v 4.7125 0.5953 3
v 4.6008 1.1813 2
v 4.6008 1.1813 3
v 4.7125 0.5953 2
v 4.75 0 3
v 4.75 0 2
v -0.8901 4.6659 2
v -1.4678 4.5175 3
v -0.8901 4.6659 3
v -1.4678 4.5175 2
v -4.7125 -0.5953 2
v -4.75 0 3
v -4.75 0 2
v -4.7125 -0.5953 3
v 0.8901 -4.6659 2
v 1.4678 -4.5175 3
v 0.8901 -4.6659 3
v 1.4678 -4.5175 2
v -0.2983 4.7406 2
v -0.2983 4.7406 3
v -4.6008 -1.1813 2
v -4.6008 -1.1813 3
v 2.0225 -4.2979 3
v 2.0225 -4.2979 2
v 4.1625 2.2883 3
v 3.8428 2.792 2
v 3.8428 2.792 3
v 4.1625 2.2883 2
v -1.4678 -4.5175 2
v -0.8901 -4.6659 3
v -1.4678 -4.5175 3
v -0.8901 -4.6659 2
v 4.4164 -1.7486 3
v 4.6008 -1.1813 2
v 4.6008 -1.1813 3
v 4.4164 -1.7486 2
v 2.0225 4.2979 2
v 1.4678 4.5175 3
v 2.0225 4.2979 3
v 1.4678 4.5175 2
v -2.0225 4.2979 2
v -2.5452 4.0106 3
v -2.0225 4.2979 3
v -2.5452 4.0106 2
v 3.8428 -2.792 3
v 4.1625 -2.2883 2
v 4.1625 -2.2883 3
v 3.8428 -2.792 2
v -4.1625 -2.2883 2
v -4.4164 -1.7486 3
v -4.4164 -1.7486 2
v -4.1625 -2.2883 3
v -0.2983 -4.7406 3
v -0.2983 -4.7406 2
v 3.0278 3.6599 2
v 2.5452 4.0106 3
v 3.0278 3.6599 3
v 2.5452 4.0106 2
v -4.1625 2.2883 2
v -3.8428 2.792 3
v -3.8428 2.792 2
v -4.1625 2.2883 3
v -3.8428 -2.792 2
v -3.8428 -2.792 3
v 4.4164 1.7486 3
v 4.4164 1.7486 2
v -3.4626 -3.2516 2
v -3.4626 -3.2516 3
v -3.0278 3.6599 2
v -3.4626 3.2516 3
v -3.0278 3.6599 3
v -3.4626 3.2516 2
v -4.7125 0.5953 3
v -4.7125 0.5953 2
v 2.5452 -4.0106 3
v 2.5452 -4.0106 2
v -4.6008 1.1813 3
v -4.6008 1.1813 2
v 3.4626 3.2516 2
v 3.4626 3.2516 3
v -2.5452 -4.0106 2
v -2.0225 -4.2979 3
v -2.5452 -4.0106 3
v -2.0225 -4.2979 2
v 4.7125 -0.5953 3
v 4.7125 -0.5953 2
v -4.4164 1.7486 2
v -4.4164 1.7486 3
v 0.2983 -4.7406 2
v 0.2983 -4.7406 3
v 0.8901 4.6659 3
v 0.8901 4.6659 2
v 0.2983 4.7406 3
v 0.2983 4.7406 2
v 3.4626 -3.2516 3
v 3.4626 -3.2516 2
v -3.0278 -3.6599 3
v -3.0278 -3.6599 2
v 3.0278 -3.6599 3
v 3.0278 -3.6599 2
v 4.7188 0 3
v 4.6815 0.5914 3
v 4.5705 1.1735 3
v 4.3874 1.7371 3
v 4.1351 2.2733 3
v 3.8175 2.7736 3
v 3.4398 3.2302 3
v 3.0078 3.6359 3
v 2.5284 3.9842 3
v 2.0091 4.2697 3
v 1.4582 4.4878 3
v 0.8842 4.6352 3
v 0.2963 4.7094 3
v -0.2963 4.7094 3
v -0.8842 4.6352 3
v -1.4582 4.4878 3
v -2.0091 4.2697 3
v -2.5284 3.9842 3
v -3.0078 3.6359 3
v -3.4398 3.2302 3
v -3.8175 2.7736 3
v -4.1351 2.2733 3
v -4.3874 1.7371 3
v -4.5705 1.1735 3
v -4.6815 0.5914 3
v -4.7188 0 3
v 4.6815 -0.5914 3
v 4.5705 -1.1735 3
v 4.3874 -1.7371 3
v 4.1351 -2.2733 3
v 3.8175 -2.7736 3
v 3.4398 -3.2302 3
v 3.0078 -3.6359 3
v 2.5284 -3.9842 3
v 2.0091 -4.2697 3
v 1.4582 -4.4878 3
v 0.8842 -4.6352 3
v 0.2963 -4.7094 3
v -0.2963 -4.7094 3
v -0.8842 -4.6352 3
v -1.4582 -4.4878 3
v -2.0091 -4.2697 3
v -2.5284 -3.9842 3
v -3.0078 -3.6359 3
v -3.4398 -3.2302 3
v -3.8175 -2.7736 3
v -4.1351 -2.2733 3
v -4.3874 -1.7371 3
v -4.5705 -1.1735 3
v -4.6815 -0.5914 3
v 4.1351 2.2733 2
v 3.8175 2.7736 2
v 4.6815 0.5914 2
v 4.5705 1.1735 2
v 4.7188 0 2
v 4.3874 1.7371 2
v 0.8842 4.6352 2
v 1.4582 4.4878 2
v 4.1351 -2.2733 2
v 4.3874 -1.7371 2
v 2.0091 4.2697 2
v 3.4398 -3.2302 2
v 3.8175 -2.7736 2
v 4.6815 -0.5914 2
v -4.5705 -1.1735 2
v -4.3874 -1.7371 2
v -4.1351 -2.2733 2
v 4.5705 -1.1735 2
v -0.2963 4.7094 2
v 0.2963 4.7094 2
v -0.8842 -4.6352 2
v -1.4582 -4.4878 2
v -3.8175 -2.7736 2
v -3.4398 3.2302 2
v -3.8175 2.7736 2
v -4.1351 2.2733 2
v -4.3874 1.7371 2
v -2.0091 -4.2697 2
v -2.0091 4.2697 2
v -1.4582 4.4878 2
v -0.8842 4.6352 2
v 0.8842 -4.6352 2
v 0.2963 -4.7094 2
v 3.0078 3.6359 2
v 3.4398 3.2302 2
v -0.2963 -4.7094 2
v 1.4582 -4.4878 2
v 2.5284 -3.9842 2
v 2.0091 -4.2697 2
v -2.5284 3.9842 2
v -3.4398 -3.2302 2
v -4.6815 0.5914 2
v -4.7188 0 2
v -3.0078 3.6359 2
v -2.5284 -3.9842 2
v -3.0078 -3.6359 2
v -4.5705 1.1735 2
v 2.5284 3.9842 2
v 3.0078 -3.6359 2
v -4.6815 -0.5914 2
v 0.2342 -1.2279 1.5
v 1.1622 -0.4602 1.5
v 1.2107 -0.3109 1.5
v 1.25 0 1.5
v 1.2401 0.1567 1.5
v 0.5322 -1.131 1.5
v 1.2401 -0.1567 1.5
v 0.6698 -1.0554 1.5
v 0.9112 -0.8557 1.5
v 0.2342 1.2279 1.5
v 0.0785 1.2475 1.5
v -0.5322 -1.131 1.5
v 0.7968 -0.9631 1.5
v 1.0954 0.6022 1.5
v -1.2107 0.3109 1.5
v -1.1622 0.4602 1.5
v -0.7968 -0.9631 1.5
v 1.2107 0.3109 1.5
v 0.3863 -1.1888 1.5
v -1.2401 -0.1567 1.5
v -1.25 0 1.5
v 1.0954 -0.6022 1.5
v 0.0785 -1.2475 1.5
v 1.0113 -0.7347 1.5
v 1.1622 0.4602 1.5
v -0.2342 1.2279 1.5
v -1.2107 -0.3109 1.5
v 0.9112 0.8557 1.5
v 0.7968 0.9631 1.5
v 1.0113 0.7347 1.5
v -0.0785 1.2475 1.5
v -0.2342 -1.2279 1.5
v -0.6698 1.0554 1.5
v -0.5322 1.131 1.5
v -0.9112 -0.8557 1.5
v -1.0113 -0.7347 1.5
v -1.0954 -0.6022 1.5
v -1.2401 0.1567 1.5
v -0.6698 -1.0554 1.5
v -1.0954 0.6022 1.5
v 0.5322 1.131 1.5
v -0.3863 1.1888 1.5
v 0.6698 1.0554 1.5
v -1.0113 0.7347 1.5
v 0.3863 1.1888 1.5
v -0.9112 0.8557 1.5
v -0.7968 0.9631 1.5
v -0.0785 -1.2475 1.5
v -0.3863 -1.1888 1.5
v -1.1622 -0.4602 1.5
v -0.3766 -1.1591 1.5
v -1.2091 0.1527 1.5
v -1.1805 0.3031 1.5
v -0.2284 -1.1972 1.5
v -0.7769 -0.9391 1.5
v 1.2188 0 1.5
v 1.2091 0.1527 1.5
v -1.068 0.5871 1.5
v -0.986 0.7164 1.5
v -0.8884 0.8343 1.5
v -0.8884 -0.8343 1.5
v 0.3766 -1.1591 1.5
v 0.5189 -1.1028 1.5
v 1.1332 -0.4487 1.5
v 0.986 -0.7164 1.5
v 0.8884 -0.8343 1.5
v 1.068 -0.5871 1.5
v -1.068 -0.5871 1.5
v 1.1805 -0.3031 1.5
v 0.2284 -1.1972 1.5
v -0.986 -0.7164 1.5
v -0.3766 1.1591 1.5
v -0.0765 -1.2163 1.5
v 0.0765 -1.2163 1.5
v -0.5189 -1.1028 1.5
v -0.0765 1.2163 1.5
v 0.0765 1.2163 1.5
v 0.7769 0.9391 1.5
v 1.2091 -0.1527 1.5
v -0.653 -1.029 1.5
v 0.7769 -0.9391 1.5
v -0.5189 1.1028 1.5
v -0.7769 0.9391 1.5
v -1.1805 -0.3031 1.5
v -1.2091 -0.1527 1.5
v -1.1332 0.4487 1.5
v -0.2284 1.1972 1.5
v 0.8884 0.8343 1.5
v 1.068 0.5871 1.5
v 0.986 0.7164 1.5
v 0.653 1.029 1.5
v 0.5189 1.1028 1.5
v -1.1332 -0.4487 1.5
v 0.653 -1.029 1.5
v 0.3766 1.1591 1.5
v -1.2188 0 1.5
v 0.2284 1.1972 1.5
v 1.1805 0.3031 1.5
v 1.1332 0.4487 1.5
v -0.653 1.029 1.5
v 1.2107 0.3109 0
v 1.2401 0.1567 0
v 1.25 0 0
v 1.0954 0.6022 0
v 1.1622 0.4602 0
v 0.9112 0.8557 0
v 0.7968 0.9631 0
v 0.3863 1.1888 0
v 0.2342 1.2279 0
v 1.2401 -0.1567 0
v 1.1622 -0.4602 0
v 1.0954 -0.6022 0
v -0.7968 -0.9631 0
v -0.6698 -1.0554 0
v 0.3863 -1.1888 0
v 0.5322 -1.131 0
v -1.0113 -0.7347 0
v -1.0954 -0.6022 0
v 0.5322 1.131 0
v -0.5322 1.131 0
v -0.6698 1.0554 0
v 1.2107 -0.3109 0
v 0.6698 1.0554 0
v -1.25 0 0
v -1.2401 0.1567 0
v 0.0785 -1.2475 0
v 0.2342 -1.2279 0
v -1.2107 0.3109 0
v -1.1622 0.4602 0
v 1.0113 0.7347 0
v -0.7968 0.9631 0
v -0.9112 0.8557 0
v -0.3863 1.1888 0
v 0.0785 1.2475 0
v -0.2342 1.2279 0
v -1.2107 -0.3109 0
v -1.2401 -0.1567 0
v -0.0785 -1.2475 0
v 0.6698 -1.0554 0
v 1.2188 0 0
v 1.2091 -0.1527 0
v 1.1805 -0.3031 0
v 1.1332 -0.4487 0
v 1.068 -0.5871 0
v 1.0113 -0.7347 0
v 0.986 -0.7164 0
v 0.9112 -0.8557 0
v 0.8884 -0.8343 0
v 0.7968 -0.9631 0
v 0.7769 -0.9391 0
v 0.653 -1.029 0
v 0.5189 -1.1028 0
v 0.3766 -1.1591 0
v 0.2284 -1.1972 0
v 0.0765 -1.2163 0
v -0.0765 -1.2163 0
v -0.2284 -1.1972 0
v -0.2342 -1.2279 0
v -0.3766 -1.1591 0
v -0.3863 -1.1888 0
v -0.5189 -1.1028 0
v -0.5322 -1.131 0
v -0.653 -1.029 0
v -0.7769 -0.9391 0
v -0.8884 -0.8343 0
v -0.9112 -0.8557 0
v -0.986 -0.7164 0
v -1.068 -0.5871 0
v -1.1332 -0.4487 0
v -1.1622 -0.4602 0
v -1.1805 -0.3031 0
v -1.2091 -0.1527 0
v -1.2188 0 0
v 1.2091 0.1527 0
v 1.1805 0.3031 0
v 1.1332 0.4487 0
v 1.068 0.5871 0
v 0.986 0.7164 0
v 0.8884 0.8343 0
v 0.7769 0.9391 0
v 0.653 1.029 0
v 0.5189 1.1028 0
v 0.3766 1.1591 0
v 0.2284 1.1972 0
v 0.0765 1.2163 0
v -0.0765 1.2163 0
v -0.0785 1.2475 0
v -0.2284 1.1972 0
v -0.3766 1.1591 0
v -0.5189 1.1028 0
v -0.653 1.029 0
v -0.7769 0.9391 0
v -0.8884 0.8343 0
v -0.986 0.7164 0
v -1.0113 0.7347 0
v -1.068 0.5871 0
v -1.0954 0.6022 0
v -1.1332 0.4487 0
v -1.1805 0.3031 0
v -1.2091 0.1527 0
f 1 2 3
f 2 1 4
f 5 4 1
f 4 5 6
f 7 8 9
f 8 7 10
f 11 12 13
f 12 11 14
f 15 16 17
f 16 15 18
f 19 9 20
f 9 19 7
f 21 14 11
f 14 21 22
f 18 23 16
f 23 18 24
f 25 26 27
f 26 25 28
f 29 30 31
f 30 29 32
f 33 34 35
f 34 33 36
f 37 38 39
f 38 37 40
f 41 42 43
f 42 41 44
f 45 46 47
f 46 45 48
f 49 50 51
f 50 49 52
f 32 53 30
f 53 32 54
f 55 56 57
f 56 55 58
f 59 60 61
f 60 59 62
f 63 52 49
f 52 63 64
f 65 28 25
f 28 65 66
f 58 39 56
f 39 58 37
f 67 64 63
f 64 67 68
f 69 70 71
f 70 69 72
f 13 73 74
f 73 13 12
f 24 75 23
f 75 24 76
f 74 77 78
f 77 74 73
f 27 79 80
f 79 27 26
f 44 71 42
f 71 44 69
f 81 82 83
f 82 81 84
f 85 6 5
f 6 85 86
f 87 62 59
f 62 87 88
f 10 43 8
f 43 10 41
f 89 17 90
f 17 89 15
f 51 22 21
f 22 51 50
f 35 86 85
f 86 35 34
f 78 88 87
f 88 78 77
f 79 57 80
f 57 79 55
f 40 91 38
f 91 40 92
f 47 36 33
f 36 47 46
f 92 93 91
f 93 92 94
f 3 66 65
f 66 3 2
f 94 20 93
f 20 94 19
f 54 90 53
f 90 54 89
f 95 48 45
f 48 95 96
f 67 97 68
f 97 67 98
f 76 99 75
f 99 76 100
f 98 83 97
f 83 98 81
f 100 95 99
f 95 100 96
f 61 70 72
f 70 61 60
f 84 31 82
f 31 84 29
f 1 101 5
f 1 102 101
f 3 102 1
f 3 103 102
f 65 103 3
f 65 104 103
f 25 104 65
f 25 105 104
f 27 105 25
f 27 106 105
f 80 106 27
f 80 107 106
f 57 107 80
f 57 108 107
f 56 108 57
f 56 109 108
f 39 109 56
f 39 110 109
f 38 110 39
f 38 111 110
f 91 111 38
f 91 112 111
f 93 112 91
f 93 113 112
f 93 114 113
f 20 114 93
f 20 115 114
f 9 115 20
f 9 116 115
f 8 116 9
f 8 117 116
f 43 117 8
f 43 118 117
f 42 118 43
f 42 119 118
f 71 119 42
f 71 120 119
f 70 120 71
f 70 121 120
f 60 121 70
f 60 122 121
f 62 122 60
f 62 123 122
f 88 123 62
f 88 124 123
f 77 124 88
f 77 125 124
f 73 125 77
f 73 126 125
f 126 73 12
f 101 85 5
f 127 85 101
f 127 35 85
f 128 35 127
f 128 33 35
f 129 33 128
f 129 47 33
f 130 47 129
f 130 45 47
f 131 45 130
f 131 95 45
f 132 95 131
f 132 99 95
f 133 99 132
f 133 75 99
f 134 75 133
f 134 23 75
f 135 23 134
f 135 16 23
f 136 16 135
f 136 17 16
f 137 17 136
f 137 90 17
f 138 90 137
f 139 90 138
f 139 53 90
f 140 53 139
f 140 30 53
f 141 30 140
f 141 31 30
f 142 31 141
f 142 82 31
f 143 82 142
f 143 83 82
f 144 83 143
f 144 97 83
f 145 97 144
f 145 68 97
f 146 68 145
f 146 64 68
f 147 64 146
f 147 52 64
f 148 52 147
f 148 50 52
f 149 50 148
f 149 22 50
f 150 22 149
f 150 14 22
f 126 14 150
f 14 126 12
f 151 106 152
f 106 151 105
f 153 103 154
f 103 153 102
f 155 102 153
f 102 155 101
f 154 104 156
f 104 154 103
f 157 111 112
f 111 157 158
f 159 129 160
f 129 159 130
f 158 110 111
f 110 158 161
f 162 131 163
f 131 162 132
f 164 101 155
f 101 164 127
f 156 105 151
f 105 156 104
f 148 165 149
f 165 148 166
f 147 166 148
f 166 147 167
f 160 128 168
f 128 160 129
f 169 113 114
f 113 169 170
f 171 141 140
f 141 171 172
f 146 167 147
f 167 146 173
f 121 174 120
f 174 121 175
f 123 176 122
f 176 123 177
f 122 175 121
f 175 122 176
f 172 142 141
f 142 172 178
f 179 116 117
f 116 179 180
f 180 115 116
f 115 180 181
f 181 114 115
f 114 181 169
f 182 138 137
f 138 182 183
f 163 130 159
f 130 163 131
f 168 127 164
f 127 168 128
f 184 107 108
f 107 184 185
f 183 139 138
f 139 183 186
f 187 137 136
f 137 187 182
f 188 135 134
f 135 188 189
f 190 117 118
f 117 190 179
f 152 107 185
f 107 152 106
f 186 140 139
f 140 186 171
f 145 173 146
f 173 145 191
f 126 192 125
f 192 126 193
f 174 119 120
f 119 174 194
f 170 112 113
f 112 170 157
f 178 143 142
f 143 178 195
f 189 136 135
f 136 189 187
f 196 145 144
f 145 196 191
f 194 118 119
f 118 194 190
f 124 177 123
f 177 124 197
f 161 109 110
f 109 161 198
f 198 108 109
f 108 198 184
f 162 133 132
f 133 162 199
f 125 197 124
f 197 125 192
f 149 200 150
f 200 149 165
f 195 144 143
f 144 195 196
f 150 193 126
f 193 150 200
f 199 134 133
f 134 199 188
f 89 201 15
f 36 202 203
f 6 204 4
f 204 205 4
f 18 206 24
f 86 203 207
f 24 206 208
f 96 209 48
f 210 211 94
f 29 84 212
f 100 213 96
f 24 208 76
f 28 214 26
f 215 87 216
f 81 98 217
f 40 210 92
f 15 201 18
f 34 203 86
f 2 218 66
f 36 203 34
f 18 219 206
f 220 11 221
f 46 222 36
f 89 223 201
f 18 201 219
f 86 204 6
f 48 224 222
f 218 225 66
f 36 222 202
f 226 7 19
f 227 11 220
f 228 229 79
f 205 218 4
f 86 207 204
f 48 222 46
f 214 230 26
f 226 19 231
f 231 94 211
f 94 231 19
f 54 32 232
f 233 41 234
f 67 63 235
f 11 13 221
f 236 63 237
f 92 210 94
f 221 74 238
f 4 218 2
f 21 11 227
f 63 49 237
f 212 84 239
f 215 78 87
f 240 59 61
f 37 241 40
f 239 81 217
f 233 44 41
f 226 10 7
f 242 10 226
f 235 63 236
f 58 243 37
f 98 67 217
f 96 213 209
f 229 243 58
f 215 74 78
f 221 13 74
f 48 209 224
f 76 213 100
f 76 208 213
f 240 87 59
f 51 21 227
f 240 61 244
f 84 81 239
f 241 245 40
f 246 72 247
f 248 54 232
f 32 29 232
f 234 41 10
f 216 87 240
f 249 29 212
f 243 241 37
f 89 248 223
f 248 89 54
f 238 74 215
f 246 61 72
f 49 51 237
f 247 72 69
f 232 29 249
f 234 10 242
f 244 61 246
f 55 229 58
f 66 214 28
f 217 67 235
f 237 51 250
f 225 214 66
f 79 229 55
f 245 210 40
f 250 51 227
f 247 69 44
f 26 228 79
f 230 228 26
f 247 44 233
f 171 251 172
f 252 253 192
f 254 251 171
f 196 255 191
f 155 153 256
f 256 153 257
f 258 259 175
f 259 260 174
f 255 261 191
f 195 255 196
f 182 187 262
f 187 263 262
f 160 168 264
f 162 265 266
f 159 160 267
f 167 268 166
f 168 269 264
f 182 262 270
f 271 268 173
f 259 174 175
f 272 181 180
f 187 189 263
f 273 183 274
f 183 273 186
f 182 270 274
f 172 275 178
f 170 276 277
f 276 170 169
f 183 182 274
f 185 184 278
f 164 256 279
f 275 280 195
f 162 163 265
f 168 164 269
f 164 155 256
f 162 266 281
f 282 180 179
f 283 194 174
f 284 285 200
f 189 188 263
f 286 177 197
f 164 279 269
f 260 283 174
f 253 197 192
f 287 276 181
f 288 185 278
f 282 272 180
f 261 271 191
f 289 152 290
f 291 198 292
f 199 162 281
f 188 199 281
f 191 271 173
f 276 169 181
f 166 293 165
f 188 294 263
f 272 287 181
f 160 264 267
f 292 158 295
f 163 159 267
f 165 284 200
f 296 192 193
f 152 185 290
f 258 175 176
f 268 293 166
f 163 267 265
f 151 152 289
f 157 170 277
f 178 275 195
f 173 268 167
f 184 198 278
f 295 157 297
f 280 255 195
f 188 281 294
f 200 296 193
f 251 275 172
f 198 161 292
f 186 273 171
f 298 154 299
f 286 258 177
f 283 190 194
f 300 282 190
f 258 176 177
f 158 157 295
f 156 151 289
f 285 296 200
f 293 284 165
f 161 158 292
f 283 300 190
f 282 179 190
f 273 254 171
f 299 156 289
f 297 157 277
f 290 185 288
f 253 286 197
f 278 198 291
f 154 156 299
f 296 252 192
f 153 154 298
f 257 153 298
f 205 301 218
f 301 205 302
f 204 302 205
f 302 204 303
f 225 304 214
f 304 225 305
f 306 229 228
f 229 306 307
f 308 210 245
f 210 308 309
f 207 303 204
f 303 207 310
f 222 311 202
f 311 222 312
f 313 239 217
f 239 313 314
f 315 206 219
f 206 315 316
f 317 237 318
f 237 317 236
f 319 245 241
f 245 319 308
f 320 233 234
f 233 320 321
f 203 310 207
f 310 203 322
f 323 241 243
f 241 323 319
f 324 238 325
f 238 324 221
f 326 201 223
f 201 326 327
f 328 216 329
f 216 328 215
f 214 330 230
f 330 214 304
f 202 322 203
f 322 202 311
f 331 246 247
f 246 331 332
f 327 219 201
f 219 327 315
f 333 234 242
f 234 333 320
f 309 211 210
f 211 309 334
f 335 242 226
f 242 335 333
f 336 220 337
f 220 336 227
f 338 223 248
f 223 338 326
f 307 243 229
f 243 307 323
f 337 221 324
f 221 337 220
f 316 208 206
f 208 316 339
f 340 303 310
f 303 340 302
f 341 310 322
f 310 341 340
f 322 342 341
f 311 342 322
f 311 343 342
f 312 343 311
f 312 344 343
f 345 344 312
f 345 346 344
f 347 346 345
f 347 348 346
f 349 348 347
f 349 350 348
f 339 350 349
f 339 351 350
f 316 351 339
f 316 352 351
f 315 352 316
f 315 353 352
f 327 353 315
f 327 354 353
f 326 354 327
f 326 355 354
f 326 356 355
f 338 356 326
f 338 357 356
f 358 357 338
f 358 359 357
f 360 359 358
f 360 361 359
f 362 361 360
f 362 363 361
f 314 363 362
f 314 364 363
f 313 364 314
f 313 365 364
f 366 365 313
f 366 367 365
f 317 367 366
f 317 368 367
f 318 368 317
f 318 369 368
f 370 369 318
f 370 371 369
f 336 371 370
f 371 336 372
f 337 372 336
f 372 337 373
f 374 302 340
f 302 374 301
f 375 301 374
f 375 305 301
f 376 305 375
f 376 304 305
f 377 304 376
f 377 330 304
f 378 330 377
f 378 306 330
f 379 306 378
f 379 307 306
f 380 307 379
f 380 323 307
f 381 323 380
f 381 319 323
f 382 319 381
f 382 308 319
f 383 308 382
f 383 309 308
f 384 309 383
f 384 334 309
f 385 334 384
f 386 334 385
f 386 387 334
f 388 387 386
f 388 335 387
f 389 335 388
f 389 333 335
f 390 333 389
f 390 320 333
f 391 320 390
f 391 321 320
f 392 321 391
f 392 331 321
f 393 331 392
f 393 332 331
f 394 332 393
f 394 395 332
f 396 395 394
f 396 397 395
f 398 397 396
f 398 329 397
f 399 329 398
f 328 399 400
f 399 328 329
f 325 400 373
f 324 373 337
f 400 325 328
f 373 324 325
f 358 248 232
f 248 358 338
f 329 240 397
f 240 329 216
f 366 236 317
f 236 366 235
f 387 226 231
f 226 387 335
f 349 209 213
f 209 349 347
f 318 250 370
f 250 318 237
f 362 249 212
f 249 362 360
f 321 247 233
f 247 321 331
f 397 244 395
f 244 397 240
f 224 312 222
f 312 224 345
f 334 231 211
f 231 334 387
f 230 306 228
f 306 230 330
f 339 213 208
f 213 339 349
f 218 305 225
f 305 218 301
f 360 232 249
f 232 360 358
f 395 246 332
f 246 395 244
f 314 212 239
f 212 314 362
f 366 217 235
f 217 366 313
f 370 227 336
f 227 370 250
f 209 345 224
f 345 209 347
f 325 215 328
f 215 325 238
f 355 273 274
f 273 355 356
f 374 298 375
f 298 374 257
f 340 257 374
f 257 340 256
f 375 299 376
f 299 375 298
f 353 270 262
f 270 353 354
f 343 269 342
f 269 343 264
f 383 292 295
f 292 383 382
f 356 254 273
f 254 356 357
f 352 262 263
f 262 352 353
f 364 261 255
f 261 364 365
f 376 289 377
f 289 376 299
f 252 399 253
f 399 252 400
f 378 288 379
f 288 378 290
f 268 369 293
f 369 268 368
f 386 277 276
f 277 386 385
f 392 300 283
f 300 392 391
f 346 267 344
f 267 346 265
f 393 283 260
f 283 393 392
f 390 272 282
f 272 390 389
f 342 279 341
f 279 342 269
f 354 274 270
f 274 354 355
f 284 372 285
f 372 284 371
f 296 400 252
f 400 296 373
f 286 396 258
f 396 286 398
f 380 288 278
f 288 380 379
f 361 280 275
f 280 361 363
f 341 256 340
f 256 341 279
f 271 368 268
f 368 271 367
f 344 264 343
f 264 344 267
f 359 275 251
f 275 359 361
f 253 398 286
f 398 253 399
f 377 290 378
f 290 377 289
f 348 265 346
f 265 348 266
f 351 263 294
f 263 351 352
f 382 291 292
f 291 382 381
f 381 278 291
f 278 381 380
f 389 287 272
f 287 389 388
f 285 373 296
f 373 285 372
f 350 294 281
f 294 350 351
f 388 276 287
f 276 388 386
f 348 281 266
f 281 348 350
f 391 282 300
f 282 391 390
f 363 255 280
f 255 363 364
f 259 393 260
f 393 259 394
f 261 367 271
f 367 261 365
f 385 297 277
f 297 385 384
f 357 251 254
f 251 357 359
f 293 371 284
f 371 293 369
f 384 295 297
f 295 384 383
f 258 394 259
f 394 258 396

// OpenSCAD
module funnel(height, mouthRadius, midRadius, midHeight, tipRadius, lipHeight, thickness=0.03125, facets=50) {
  union() {
    // lip of outer cone
    difference() {
      translate([0, 0, height]) cylinder(r=mouthRadius, h=lipHeight, $fn=facets);
      translate([0, 0, height]) cylinder(r=mouthRadius - thickness, h=lipHeight, $fn=facets);
    }

    // cone
    difference() {
      translate([0, 0, midHeight]) cylinder(height-midHeight, midRadius, mouthRadius, $fn=facets);
      translate([0, 0, midHeight]) cylinder(height-midHeight, midRadius-thickness, mouthRadius-thickness, $fn=facets);
    }

	  //stem
    difference() {
      cylinder(midHeight, tipRadius, midRadius, $fn=facets);
      cylinder(midHeight, tipRadius-thickness, midRadius-thickness, $fn=facets);
    }

  }
}

funnel(
	height= 2,				// height of whole creation 
	mouthRadius = 4.75,	// widest part of the funnel
	midRadius = 1.25,		// width where the cone meets the stem
	midHeight = 1.5, 		// height of the stem
	tipRadius = 1.25,		// radius of the bottom of the stem
	lipHeight = 1			// Height of the lip
);
